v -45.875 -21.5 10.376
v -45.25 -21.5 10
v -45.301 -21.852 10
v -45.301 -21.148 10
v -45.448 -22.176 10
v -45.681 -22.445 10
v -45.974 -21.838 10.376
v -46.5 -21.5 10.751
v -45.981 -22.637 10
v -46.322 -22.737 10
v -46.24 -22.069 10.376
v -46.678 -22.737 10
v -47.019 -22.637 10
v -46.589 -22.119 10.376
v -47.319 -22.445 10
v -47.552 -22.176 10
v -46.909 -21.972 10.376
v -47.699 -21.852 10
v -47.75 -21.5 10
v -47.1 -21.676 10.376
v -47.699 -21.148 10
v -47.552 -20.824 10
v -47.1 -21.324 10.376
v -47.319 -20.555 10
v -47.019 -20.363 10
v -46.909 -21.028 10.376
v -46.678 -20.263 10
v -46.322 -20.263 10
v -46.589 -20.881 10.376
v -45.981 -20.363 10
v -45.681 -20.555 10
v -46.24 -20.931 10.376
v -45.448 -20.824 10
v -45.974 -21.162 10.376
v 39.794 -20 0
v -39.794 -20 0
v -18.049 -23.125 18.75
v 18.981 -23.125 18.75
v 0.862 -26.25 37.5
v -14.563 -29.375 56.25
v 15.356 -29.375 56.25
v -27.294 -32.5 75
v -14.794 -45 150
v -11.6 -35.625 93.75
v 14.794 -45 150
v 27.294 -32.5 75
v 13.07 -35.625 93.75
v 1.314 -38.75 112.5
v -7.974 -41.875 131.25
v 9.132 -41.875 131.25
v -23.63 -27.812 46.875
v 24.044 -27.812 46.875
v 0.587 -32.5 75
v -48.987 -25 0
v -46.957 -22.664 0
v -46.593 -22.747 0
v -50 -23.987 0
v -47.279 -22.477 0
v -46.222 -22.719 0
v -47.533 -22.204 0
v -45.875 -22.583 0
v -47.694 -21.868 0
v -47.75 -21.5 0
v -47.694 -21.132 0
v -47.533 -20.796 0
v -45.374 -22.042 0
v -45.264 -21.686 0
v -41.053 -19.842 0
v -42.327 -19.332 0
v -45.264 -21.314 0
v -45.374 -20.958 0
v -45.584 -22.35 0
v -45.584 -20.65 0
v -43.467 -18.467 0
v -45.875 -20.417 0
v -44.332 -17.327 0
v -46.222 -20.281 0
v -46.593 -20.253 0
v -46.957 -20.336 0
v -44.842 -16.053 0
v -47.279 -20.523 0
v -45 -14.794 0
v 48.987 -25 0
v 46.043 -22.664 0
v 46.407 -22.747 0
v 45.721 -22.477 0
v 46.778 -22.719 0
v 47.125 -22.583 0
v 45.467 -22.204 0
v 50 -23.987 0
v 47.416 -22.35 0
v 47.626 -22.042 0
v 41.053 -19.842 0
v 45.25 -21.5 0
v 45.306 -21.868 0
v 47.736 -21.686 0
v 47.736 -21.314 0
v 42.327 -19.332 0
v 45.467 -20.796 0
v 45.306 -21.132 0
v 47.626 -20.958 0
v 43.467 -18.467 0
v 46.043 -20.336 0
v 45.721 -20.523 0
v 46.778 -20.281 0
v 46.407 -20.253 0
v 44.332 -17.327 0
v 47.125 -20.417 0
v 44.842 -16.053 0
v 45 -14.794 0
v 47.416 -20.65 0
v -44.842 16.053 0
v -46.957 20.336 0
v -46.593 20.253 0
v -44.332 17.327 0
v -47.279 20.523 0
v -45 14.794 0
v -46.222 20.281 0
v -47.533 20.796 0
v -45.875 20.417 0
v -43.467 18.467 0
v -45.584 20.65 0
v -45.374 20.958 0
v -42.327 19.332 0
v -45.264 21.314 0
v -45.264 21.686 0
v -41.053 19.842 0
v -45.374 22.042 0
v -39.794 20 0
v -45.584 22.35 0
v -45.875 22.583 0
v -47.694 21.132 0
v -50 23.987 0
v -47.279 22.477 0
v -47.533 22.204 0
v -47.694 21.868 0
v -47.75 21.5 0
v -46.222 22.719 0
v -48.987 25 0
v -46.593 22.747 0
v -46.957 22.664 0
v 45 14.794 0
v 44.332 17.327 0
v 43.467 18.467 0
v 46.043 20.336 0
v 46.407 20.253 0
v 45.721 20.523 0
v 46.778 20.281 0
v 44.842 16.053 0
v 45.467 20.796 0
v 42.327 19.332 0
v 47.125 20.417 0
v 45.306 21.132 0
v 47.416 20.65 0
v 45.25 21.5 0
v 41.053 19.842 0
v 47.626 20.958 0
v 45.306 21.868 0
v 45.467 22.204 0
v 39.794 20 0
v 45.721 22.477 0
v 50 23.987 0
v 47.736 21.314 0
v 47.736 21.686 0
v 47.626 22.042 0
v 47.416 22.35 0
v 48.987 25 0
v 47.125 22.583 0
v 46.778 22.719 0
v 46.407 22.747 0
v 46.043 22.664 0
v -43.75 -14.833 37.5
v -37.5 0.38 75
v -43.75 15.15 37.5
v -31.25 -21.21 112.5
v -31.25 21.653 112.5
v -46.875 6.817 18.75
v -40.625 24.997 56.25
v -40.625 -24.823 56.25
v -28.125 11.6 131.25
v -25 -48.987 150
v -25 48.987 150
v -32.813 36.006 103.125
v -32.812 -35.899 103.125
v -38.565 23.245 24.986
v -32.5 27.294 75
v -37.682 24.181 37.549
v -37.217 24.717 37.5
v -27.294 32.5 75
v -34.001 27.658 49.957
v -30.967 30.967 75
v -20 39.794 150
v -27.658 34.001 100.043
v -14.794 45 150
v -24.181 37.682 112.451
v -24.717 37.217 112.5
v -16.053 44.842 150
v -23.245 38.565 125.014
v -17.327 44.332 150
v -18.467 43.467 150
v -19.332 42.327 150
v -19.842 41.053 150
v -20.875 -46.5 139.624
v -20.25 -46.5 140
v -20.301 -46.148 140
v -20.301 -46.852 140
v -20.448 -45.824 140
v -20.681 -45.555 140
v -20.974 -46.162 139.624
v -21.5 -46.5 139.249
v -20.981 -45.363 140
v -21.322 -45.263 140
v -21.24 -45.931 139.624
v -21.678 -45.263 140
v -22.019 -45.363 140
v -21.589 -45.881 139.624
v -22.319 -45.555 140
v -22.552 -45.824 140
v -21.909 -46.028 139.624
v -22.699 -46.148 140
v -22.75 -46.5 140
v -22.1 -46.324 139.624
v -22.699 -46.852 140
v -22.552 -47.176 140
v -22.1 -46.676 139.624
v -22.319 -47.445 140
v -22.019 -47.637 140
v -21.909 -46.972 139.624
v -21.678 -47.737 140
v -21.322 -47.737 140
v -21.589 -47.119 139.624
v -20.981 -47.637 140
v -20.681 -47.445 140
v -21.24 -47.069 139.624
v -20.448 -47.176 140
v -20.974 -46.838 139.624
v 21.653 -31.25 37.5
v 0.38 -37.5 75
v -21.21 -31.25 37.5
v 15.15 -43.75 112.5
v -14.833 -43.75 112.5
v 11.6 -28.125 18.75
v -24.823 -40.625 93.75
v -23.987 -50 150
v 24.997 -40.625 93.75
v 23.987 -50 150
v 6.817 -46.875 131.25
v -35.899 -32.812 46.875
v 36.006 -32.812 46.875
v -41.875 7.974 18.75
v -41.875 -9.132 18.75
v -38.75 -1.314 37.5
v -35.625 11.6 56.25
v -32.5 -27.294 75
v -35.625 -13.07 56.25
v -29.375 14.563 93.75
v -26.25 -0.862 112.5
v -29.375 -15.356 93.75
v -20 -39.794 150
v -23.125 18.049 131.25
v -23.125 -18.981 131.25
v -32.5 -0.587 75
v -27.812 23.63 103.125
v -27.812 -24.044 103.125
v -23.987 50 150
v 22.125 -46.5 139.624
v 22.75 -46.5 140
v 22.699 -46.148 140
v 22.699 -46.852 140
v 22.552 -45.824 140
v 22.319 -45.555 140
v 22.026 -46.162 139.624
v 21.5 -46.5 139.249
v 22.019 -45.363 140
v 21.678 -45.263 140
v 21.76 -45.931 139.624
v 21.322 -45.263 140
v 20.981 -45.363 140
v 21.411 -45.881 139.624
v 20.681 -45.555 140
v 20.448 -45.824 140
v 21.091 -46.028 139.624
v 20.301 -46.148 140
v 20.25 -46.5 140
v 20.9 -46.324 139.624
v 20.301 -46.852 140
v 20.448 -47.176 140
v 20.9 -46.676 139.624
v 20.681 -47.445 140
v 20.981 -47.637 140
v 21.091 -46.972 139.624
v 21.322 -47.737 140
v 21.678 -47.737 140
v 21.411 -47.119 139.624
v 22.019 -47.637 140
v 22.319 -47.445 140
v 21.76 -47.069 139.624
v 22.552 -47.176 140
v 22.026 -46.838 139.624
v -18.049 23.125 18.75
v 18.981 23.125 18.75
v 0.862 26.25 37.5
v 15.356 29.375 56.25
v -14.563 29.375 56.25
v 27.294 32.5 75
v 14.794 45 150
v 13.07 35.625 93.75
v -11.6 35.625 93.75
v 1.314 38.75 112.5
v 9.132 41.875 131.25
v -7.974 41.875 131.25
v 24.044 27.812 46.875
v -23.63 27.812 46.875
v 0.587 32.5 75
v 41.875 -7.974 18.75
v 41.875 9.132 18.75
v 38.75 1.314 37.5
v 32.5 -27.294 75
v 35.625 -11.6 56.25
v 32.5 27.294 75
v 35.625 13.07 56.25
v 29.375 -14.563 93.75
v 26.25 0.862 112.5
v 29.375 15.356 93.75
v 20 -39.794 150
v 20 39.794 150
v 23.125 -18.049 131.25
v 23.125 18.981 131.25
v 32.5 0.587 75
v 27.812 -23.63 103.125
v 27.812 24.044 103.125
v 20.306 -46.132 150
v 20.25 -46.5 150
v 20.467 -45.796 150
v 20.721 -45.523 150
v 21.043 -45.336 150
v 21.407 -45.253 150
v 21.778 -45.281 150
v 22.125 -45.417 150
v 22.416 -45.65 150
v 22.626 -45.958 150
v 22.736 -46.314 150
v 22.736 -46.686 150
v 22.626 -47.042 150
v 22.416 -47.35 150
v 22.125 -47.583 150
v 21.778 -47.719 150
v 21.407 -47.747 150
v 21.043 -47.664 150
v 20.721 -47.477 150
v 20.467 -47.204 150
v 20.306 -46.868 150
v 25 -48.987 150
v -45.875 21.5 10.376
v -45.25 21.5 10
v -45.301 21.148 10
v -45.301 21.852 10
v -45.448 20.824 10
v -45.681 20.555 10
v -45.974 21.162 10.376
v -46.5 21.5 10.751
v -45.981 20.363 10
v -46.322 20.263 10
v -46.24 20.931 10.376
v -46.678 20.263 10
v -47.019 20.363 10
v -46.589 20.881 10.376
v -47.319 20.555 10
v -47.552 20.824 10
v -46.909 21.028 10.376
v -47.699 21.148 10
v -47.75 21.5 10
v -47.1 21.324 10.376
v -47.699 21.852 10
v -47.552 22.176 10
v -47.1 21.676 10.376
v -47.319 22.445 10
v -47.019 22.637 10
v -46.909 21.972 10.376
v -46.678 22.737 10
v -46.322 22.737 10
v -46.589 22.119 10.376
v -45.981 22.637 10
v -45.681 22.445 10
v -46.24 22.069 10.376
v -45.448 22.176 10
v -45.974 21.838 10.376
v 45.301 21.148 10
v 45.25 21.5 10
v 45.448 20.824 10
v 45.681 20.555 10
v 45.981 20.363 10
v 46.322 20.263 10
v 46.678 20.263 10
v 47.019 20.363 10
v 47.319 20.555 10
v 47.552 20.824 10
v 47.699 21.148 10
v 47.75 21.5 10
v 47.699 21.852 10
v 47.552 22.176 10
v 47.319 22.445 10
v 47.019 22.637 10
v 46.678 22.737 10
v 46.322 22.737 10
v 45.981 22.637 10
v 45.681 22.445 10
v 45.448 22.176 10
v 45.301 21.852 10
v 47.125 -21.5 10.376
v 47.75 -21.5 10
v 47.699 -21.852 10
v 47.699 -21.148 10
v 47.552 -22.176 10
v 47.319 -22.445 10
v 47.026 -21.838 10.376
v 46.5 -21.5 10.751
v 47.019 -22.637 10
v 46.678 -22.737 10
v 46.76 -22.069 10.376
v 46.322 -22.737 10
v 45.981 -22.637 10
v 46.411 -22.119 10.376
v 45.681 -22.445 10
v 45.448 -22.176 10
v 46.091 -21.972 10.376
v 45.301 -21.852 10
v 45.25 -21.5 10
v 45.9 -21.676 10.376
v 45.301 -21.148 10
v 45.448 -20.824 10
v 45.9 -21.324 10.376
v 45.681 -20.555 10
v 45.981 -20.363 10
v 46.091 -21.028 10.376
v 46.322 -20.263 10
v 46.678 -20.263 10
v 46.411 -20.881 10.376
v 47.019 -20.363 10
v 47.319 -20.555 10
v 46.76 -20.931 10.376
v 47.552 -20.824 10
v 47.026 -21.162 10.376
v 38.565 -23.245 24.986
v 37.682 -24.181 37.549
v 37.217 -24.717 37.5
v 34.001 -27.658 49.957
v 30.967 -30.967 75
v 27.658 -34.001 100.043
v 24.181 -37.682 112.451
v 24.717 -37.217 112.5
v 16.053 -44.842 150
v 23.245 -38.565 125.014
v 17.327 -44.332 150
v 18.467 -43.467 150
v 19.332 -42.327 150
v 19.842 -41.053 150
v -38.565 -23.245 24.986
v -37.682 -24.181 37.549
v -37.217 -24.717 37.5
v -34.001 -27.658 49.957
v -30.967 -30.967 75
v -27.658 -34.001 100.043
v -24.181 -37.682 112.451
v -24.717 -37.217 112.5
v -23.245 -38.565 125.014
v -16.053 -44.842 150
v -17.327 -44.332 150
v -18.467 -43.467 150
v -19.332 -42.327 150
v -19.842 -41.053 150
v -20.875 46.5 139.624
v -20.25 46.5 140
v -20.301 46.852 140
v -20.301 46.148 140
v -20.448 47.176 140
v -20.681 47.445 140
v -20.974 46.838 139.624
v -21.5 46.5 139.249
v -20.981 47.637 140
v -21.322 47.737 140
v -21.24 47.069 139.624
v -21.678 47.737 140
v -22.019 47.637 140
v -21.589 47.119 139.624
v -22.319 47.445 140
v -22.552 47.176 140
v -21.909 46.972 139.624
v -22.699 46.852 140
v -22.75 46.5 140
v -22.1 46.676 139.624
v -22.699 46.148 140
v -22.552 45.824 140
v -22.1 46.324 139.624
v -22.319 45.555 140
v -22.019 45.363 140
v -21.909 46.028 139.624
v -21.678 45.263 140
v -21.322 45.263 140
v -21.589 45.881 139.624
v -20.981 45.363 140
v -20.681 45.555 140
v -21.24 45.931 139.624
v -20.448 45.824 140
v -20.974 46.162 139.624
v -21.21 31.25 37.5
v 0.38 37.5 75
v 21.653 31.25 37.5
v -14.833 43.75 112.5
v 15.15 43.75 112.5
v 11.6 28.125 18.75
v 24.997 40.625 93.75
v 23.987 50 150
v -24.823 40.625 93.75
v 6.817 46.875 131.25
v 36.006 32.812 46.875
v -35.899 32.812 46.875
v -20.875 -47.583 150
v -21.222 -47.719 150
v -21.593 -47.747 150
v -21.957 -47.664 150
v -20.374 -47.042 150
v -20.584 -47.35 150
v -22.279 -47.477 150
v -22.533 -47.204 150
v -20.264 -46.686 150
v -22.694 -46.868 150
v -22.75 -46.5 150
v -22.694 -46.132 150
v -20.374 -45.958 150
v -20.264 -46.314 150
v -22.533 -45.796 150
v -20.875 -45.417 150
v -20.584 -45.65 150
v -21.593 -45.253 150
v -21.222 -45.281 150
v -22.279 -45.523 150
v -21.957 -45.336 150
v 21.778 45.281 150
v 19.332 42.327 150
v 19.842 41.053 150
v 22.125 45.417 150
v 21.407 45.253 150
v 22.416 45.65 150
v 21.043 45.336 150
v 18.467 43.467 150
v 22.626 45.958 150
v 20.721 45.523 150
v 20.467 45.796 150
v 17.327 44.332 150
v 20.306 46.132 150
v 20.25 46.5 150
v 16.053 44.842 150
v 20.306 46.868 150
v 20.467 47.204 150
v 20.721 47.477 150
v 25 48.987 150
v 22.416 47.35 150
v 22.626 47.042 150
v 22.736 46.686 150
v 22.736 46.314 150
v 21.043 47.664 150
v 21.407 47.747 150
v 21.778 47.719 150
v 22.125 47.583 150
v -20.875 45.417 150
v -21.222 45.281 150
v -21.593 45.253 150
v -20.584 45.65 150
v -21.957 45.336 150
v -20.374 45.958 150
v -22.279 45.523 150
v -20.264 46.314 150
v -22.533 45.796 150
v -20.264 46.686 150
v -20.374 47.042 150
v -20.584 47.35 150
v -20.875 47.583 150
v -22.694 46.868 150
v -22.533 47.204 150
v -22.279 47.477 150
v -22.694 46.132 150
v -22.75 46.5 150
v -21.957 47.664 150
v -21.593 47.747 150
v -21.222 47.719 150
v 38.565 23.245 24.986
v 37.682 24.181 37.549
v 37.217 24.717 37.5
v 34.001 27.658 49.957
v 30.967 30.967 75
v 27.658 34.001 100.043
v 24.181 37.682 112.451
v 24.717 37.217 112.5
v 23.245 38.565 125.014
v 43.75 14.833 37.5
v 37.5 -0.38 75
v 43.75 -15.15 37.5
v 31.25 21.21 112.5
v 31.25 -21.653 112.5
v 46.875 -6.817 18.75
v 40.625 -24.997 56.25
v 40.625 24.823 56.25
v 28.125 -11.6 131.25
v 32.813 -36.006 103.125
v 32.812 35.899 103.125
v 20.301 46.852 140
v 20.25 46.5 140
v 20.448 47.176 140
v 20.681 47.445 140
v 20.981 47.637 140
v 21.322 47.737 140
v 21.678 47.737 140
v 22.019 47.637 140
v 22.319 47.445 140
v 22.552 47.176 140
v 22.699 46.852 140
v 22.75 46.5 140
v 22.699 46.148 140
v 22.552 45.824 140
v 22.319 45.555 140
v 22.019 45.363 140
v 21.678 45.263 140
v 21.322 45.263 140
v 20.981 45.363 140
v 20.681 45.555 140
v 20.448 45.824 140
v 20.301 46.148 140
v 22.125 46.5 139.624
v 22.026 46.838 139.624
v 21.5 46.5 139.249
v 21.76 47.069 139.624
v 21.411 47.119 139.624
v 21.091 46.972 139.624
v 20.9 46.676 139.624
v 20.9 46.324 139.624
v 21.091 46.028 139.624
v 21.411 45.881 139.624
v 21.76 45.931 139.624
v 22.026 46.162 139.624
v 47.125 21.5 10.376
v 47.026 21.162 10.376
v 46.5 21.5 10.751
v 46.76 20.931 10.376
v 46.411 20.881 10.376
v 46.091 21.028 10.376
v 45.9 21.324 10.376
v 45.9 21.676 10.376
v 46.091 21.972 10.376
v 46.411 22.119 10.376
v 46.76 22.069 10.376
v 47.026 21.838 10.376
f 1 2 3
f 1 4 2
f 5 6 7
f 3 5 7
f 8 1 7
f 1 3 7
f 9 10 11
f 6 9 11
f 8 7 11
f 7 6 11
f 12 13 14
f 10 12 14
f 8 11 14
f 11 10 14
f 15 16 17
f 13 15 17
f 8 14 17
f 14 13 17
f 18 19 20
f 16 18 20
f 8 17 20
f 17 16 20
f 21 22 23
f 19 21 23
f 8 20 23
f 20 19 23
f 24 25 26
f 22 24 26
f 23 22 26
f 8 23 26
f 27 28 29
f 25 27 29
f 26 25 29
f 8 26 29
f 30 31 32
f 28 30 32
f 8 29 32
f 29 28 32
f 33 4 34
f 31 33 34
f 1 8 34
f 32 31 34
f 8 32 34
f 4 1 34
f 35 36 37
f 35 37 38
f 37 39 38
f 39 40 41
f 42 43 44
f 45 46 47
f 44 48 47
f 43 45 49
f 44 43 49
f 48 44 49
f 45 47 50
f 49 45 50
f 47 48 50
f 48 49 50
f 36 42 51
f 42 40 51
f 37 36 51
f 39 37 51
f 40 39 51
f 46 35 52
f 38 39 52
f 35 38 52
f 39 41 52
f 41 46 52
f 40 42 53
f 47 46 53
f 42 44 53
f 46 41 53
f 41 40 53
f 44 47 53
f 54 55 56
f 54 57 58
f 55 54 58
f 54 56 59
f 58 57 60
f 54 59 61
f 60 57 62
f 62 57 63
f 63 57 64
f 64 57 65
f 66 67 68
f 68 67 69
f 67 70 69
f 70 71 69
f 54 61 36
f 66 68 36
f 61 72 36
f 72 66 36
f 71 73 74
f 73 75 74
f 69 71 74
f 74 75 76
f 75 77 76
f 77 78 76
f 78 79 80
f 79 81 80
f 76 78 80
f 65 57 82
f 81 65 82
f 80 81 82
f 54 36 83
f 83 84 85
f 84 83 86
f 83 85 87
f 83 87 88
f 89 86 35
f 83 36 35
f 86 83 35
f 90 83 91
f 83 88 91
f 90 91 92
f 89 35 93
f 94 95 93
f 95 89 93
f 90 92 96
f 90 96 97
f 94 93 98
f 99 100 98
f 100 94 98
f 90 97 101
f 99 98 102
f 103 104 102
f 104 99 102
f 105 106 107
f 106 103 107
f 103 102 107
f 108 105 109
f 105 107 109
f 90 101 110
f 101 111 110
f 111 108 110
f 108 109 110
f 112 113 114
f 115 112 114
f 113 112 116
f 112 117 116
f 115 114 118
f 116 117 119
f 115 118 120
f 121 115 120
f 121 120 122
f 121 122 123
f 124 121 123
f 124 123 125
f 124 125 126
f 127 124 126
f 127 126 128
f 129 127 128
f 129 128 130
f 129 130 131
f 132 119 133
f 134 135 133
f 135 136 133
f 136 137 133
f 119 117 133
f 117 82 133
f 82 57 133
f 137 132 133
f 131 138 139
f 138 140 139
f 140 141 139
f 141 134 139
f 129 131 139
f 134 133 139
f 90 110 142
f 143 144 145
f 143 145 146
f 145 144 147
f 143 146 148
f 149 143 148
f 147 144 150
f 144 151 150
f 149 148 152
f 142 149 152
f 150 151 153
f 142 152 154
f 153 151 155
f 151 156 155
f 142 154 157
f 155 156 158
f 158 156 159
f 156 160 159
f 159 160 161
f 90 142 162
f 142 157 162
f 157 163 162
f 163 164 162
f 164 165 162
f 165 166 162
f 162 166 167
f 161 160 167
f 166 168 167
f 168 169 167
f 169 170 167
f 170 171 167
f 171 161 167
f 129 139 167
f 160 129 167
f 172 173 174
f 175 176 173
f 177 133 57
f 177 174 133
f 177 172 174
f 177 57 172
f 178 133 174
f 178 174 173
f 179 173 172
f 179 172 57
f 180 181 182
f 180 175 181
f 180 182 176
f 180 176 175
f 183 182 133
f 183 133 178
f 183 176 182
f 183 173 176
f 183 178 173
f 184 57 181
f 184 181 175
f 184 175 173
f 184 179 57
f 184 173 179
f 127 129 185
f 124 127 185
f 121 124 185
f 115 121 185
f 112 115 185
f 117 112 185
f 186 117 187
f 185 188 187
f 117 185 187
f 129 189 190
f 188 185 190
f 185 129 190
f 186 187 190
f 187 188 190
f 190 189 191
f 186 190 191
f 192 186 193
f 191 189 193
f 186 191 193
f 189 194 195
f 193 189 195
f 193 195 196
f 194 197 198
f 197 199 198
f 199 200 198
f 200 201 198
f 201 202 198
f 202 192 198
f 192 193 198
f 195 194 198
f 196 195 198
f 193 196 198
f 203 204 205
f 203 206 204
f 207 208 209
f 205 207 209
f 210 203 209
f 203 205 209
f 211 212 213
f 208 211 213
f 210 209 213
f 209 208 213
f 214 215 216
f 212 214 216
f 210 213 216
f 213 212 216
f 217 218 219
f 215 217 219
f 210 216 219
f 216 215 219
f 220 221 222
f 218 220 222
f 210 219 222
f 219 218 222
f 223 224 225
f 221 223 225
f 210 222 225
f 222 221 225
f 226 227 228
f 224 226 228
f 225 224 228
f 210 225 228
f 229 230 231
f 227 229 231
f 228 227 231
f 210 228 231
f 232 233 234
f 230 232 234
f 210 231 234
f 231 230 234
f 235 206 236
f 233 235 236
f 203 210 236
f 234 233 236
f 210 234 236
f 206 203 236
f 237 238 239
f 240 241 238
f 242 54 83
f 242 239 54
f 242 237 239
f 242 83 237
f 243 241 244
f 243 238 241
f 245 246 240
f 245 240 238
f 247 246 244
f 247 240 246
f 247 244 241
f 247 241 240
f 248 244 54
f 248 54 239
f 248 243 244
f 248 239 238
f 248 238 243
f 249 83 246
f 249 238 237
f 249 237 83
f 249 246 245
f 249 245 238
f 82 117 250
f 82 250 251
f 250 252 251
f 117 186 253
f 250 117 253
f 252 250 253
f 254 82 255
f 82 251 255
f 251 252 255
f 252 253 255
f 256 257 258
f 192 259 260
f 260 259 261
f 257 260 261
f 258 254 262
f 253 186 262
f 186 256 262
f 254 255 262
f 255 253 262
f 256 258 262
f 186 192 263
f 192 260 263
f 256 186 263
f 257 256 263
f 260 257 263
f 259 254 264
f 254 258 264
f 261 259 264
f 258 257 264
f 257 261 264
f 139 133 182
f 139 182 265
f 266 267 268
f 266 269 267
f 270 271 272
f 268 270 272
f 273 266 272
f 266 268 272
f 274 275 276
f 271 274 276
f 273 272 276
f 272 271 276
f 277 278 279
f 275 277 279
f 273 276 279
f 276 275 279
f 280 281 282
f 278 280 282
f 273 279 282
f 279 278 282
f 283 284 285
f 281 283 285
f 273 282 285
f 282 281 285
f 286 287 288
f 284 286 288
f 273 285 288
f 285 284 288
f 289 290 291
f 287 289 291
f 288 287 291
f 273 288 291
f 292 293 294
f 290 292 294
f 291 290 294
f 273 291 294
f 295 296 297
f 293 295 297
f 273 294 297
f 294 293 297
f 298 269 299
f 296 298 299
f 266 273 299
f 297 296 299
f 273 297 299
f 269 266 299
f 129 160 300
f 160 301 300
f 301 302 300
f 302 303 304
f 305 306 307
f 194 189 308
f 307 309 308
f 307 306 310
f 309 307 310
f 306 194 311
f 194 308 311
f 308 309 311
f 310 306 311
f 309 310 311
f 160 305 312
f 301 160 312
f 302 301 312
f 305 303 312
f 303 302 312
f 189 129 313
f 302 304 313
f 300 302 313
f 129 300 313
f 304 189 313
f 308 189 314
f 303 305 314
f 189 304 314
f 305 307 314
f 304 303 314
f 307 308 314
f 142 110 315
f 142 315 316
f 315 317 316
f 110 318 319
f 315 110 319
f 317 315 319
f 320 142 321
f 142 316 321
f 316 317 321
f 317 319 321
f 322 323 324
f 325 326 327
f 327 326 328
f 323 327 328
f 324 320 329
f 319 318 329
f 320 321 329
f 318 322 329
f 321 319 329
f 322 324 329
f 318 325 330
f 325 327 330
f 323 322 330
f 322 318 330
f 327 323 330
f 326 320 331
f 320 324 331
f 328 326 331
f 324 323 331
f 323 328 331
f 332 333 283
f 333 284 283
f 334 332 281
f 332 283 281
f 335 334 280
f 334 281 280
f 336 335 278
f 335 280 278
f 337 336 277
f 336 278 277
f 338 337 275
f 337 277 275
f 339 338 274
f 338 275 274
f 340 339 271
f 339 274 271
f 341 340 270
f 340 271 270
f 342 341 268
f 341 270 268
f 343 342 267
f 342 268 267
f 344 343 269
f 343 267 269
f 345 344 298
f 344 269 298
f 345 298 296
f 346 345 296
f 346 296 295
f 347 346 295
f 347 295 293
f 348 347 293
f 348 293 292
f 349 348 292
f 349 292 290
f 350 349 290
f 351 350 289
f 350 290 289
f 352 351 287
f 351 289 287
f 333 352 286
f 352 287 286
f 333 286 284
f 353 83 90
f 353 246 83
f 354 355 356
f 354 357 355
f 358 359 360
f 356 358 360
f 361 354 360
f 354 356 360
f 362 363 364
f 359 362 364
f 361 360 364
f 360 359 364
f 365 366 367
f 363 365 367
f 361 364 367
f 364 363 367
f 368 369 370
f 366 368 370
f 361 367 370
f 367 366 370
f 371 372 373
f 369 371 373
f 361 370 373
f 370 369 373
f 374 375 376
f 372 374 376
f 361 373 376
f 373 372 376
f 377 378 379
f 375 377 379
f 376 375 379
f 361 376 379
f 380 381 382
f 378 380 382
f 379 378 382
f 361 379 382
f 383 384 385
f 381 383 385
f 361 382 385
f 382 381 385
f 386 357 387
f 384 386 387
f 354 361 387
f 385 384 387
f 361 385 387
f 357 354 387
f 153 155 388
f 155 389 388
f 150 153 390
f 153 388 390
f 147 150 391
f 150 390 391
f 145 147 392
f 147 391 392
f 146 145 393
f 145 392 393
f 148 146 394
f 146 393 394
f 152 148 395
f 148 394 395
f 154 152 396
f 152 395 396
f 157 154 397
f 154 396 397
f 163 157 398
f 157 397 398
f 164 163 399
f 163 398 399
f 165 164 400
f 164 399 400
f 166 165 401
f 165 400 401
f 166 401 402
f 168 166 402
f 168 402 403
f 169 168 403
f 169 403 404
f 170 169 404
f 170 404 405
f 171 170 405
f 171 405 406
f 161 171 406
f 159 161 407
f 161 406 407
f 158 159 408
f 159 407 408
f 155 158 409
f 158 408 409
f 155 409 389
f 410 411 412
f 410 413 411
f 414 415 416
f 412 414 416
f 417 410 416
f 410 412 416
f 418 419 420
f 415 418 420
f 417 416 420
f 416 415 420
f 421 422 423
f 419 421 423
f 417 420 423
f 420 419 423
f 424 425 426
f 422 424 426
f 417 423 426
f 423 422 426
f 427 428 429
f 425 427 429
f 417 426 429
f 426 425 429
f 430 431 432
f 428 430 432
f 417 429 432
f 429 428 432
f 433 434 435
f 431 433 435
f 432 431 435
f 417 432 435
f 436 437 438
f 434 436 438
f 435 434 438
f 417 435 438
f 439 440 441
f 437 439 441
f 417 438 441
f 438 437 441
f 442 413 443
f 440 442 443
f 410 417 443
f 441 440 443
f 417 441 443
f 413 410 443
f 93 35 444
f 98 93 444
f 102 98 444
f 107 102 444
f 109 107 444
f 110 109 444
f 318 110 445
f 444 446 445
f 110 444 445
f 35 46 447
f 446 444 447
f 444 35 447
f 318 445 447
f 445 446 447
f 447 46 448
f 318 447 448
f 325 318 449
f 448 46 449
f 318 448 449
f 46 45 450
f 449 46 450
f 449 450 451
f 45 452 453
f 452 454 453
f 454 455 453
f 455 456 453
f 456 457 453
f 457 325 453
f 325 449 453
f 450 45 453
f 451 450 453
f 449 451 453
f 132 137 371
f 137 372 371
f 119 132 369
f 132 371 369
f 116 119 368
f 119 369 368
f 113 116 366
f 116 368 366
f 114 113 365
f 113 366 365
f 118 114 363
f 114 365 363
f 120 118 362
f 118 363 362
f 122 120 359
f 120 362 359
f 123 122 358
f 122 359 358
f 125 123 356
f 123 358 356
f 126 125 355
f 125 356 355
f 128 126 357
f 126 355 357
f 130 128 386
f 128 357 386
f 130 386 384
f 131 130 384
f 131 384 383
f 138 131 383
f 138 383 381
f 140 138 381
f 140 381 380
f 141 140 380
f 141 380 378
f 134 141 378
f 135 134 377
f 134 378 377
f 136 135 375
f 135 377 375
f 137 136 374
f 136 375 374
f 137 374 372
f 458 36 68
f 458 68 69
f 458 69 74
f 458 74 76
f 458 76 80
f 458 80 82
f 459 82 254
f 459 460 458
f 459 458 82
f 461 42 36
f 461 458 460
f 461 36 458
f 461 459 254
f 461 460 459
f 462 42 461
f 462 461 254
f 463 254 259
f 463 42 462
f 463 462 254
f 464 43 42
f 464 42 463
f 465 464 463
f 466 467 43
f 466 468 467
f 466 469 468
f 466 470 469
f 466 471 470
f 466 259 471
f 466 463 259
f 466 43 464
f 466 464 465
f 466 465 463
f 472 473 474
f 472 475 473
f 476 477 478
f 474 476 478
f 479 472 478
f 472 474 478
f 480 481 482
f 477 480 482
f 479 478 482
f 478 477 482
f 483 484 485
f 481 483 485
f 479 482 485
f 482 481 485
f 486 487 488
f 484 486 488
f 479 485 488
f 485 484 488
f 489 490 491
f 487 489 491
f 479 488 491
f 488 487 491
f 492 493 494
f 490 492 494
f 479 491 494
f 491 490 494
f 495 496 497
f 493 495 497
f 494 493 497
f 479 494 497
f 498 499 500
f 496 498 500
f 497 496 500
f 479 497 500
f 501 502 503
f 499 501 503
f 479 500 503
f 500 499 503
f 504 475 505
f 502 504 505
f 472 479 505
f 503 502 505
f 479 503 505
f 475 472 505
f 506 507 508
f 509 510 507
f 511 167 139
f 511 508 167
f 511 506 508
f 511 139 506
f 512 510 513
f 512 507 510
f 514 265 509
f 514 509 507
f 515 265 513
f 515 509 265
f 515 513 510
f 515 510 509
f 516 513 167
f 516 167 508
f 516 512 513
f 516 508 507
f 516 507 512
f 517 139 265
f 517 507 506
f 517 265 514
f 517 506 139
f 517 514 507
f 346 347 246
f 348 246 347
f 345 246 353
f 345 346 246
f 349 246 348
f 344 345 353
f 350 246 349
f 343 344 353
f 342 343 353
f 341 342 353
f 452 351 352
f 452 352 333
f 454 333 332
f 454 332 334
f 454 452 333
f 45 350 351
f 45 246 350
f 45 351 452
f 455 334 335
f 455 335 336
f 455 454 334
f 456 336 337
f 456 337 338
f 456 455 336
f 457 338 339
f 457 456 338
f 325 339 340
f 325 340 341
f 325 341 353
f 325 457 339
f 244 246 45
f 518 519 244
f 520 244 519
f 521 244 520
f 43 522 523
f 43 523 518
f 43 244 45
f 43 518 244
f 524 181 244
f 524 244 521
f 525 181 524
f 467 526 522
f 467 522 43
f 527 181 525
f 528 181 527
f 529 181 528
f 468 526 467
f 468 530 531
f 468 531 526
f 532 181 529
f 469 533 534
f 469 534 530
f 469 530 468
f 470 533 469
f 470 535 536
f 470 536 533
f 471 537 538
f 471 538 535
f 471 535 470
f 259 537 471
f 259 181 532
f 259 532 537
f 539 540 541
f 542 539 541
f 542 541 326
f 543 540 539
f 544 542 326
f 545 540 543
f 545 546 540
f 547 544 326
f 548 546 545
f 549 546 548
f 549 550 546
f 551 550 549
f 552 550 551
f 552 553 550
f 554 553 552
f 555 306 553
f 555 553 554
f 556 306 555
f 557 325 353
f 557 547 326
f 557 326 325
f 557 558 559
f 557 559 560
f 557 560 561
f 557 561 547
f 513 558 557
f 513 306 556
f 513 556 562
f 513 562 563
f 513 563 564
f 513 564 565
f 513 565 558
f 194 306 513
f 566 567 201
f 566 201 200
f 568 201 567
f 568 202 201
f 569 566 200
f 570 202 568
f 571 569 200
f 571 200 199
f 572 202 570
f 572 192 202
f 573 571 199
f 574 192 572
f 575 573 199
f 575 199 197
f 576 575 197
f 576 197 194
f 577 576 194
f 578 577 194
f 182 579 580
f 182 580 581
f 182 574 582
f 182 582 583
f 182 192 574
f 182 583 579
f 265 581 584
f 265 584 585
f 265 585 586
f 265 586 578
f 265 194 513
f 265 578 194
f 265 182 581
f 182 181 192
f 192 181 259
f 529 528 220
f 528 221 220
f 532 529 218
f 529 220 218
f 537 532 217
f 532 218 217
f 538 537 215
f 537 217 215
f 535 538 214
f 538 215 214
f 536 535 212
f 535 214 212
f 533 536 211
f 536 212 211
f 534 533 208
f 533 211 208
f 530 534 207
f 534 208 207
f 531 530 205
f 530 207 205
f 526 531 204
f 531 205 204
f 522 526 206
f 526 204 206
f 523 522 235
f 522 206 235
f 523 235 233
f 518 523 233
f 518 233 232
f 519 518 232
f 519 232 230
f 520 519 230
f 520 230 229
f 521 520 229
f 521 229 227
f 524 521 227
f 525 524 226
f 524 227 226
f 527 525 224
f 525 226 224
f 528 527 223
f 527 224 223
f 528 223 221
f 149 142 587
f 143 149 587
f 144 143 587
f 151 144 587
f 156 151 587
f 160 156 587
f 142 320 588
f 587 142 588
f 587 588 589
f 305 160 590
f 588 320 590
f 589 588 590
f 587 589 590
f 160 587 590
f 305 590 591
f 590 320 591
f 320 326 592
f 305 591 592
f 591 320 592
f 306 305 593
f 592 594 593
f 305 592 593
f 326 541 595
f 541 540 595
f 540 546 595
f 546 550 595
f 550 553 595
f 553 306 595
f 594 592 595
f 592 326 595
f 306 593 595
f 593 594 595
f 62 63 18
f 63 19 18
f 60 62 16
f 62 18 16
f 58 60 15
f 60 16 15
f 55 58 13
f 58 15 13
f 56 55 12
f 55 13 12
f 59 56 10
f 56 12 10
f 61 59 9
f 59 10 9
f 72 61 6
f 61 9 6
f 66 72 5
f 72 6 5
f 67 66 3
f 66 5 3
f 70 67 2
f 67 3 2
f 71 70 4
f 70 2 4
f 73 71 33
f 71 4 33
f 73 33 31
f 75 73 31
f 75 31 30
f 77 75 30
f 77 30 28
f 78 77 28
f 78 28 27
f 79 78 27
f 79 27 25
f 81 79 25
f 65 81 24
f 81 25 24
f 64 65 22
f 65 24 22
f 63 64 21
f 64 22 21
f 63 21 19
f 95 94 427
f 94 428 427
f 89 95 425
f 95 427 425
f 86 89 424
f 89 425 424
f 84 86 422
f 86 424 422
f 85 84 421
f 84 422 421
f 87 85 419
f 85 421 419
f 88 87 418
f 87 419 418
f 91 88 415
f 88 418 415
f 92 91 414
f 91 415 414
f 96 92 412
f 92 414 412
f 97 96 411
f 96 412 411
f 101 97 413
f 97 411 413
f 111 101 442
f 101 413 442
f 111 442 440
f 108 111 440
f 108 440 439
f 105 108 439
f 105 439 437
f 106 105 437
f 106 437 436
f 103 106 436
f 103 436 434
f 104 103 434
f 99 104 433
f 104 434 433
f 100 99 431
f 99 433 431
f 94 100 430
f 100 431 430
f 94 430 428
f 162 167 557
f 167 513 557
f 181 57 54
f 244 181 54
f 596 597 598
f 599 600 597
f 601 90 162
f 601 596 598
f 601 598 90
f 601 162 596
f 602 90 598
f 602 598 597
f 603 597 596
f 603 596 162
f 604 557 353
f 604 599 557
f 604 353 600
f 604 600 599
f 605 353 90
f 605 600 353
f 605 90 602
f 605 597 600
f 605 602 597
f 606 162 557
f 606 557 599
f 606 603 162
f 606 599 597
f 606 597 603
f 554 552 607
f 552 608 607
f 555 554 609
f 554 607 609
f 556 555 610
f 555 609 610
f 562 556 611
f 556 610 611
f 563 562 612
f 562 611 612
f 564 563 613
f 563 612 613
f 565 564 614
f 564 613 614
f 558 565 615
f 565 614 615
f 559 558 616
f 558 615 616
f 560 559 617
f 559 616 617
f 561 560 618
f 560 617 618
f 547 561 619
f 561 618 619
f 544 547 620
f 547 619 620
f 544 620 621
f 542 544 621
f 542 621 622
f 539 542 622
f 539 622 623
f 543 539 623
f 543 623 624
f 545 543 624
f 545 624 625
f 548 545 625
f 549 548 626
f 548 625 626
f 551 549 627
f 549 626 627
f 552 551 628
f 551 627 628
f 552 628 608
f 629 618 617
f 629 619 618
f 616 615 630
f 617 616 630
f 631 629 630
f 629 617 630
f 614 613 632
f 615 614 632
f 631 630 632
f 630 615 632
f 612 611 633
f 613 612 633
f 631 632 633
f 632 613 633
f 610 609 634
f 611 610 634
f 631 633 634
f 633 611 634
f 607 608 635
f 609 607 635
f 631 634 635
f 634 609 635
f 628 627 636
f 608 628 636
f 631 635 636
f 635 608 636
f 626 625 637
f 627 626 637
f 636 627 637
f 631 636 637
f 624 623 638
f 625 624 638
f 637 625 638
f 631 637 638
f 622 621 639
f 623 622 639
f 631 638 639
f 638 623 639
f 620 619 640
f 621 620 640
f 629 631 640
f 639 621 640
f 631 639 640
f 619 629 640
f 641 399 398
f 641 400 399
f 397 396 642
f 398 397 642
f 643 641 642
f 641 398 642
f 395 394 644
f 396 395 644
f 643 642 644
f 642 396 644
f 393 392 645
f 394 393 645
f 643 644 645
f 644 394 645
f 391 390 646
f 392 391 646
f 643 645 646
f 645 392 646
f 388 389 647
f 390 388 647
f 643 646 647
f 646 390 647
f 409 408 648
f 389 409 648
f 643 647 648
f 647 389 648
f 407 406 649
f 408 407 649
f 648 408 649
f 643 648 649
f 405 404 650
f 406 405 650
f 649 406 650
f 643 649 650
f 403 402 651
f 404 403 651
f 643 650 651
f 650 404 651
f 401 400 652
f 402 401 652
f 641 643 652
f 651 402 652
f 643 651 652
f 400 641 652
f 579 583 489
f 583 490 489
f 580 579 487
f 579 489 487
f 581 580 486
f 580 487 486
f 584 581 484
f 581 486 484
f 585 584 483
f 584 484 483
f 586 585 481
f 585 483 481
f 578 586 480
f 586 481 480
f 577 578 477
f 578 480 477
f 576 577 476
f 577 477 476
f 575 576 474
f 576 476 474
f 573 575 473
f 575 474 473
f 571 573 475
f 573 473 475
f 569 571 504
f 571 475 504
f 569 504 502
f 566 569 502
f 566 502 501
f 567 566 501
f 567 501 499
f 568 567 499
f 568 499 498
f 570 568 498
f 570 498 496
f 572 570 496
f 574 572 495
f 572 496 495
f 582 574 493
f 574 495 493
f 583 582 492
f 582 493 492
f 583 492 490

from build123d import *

# Parameters (mm, degrees)
F1_W      = 100
F1_H      = 50
F3_W      = 50
F3_H      = 100
F2_W      = 90
F2_H      = 40
F4_W      = 40
F4_H      = 90
F7_R      = 5
F8_SIZE   = 1
F9_D      = 2.5
F9_DEPTH  = 10
F9_TIP    = 0.7510757738
F10_D     = 2.5
F10_DEPTH = 10
F10_TIP   = 0.7510757738


with BuildPart() as f5:
    # F1 (on Top) → F5 section 0
    with BuildSketch(Plane.XY):
        Rectangle(F1_W, F1_H)
    # F3 (on offset) → F5 section 1
    with BuildSketch(Plane.XY.offset(150)):
        Rectangle(F3_W, F3_H)
    loft()

    # F2 (on Top) → F6 section 0
    with BuildSketch(Plane.XY):
        Rectangle(F2_W, F2_H)
    # F4 (on offset) → F6 section 1
    with BuildSketch(Plane.XY.offset(150)):
        Rectangle(F4_W, F4_H)
    loft(mode=Mode.SUBTRACT)

    # F7
    f7_edges = [f5.edges().sort_by_distance(p)[0] for p in [
        (-32.5, 32.5, 75),
        (32.5, 32.5, 75),
        (32.5, -32.5, 75),
        (-32.5, -32.5, 75),
    ]]
    fillet(f7_edges, radius=F7_R)

    # F8
    f8_edges = [f5.edges().sort_by_distance(p)[0] for p in [
        (37.5, 37.5, 75),
        (-37.5, 37.5, 75),
        (37.5, -37.5, 75),
        (-37.5, -37.5, 75),
    ]]
    chamfer(f8_edges, length=F8_SIZE)

    # F9
    with Locations(Plane.XY.offset(150)):
        with Locations((21.5, 46.5), (21.5, -46.5), (-21.5, -46.5), (-21.5, 46.5)):
            Hole(F9_D / 2, depth=F9_DEPTH)
            with Locations((0, 0, -(F9_DEPTH + F9_TIP / 2))):  # 118° drill point
                Cone(0, F9_D / 2, F9_TIP, mode=Mode.SUBTRACT)

    # F10
    with Locations(Plane(origin=(0, 0, 0), x_dir=(1, 0, 0), z_dir=(0, 0, -1))):
        with Locations((46.5, -21.5), (-46.5, -21.5), (-46.5, 21.5), (46.5, 21.5)):
            Hole(F10_D / 2, depth=F10_DEPTH)
            with Locations((0, 0, -(F10_DEPTH + F10_TIP / 2))):  # 118° drill point
                Cone(0, F10_D / 2, F10_TIP, mode=Mode.SUBTRACT)


solid = f5.part
